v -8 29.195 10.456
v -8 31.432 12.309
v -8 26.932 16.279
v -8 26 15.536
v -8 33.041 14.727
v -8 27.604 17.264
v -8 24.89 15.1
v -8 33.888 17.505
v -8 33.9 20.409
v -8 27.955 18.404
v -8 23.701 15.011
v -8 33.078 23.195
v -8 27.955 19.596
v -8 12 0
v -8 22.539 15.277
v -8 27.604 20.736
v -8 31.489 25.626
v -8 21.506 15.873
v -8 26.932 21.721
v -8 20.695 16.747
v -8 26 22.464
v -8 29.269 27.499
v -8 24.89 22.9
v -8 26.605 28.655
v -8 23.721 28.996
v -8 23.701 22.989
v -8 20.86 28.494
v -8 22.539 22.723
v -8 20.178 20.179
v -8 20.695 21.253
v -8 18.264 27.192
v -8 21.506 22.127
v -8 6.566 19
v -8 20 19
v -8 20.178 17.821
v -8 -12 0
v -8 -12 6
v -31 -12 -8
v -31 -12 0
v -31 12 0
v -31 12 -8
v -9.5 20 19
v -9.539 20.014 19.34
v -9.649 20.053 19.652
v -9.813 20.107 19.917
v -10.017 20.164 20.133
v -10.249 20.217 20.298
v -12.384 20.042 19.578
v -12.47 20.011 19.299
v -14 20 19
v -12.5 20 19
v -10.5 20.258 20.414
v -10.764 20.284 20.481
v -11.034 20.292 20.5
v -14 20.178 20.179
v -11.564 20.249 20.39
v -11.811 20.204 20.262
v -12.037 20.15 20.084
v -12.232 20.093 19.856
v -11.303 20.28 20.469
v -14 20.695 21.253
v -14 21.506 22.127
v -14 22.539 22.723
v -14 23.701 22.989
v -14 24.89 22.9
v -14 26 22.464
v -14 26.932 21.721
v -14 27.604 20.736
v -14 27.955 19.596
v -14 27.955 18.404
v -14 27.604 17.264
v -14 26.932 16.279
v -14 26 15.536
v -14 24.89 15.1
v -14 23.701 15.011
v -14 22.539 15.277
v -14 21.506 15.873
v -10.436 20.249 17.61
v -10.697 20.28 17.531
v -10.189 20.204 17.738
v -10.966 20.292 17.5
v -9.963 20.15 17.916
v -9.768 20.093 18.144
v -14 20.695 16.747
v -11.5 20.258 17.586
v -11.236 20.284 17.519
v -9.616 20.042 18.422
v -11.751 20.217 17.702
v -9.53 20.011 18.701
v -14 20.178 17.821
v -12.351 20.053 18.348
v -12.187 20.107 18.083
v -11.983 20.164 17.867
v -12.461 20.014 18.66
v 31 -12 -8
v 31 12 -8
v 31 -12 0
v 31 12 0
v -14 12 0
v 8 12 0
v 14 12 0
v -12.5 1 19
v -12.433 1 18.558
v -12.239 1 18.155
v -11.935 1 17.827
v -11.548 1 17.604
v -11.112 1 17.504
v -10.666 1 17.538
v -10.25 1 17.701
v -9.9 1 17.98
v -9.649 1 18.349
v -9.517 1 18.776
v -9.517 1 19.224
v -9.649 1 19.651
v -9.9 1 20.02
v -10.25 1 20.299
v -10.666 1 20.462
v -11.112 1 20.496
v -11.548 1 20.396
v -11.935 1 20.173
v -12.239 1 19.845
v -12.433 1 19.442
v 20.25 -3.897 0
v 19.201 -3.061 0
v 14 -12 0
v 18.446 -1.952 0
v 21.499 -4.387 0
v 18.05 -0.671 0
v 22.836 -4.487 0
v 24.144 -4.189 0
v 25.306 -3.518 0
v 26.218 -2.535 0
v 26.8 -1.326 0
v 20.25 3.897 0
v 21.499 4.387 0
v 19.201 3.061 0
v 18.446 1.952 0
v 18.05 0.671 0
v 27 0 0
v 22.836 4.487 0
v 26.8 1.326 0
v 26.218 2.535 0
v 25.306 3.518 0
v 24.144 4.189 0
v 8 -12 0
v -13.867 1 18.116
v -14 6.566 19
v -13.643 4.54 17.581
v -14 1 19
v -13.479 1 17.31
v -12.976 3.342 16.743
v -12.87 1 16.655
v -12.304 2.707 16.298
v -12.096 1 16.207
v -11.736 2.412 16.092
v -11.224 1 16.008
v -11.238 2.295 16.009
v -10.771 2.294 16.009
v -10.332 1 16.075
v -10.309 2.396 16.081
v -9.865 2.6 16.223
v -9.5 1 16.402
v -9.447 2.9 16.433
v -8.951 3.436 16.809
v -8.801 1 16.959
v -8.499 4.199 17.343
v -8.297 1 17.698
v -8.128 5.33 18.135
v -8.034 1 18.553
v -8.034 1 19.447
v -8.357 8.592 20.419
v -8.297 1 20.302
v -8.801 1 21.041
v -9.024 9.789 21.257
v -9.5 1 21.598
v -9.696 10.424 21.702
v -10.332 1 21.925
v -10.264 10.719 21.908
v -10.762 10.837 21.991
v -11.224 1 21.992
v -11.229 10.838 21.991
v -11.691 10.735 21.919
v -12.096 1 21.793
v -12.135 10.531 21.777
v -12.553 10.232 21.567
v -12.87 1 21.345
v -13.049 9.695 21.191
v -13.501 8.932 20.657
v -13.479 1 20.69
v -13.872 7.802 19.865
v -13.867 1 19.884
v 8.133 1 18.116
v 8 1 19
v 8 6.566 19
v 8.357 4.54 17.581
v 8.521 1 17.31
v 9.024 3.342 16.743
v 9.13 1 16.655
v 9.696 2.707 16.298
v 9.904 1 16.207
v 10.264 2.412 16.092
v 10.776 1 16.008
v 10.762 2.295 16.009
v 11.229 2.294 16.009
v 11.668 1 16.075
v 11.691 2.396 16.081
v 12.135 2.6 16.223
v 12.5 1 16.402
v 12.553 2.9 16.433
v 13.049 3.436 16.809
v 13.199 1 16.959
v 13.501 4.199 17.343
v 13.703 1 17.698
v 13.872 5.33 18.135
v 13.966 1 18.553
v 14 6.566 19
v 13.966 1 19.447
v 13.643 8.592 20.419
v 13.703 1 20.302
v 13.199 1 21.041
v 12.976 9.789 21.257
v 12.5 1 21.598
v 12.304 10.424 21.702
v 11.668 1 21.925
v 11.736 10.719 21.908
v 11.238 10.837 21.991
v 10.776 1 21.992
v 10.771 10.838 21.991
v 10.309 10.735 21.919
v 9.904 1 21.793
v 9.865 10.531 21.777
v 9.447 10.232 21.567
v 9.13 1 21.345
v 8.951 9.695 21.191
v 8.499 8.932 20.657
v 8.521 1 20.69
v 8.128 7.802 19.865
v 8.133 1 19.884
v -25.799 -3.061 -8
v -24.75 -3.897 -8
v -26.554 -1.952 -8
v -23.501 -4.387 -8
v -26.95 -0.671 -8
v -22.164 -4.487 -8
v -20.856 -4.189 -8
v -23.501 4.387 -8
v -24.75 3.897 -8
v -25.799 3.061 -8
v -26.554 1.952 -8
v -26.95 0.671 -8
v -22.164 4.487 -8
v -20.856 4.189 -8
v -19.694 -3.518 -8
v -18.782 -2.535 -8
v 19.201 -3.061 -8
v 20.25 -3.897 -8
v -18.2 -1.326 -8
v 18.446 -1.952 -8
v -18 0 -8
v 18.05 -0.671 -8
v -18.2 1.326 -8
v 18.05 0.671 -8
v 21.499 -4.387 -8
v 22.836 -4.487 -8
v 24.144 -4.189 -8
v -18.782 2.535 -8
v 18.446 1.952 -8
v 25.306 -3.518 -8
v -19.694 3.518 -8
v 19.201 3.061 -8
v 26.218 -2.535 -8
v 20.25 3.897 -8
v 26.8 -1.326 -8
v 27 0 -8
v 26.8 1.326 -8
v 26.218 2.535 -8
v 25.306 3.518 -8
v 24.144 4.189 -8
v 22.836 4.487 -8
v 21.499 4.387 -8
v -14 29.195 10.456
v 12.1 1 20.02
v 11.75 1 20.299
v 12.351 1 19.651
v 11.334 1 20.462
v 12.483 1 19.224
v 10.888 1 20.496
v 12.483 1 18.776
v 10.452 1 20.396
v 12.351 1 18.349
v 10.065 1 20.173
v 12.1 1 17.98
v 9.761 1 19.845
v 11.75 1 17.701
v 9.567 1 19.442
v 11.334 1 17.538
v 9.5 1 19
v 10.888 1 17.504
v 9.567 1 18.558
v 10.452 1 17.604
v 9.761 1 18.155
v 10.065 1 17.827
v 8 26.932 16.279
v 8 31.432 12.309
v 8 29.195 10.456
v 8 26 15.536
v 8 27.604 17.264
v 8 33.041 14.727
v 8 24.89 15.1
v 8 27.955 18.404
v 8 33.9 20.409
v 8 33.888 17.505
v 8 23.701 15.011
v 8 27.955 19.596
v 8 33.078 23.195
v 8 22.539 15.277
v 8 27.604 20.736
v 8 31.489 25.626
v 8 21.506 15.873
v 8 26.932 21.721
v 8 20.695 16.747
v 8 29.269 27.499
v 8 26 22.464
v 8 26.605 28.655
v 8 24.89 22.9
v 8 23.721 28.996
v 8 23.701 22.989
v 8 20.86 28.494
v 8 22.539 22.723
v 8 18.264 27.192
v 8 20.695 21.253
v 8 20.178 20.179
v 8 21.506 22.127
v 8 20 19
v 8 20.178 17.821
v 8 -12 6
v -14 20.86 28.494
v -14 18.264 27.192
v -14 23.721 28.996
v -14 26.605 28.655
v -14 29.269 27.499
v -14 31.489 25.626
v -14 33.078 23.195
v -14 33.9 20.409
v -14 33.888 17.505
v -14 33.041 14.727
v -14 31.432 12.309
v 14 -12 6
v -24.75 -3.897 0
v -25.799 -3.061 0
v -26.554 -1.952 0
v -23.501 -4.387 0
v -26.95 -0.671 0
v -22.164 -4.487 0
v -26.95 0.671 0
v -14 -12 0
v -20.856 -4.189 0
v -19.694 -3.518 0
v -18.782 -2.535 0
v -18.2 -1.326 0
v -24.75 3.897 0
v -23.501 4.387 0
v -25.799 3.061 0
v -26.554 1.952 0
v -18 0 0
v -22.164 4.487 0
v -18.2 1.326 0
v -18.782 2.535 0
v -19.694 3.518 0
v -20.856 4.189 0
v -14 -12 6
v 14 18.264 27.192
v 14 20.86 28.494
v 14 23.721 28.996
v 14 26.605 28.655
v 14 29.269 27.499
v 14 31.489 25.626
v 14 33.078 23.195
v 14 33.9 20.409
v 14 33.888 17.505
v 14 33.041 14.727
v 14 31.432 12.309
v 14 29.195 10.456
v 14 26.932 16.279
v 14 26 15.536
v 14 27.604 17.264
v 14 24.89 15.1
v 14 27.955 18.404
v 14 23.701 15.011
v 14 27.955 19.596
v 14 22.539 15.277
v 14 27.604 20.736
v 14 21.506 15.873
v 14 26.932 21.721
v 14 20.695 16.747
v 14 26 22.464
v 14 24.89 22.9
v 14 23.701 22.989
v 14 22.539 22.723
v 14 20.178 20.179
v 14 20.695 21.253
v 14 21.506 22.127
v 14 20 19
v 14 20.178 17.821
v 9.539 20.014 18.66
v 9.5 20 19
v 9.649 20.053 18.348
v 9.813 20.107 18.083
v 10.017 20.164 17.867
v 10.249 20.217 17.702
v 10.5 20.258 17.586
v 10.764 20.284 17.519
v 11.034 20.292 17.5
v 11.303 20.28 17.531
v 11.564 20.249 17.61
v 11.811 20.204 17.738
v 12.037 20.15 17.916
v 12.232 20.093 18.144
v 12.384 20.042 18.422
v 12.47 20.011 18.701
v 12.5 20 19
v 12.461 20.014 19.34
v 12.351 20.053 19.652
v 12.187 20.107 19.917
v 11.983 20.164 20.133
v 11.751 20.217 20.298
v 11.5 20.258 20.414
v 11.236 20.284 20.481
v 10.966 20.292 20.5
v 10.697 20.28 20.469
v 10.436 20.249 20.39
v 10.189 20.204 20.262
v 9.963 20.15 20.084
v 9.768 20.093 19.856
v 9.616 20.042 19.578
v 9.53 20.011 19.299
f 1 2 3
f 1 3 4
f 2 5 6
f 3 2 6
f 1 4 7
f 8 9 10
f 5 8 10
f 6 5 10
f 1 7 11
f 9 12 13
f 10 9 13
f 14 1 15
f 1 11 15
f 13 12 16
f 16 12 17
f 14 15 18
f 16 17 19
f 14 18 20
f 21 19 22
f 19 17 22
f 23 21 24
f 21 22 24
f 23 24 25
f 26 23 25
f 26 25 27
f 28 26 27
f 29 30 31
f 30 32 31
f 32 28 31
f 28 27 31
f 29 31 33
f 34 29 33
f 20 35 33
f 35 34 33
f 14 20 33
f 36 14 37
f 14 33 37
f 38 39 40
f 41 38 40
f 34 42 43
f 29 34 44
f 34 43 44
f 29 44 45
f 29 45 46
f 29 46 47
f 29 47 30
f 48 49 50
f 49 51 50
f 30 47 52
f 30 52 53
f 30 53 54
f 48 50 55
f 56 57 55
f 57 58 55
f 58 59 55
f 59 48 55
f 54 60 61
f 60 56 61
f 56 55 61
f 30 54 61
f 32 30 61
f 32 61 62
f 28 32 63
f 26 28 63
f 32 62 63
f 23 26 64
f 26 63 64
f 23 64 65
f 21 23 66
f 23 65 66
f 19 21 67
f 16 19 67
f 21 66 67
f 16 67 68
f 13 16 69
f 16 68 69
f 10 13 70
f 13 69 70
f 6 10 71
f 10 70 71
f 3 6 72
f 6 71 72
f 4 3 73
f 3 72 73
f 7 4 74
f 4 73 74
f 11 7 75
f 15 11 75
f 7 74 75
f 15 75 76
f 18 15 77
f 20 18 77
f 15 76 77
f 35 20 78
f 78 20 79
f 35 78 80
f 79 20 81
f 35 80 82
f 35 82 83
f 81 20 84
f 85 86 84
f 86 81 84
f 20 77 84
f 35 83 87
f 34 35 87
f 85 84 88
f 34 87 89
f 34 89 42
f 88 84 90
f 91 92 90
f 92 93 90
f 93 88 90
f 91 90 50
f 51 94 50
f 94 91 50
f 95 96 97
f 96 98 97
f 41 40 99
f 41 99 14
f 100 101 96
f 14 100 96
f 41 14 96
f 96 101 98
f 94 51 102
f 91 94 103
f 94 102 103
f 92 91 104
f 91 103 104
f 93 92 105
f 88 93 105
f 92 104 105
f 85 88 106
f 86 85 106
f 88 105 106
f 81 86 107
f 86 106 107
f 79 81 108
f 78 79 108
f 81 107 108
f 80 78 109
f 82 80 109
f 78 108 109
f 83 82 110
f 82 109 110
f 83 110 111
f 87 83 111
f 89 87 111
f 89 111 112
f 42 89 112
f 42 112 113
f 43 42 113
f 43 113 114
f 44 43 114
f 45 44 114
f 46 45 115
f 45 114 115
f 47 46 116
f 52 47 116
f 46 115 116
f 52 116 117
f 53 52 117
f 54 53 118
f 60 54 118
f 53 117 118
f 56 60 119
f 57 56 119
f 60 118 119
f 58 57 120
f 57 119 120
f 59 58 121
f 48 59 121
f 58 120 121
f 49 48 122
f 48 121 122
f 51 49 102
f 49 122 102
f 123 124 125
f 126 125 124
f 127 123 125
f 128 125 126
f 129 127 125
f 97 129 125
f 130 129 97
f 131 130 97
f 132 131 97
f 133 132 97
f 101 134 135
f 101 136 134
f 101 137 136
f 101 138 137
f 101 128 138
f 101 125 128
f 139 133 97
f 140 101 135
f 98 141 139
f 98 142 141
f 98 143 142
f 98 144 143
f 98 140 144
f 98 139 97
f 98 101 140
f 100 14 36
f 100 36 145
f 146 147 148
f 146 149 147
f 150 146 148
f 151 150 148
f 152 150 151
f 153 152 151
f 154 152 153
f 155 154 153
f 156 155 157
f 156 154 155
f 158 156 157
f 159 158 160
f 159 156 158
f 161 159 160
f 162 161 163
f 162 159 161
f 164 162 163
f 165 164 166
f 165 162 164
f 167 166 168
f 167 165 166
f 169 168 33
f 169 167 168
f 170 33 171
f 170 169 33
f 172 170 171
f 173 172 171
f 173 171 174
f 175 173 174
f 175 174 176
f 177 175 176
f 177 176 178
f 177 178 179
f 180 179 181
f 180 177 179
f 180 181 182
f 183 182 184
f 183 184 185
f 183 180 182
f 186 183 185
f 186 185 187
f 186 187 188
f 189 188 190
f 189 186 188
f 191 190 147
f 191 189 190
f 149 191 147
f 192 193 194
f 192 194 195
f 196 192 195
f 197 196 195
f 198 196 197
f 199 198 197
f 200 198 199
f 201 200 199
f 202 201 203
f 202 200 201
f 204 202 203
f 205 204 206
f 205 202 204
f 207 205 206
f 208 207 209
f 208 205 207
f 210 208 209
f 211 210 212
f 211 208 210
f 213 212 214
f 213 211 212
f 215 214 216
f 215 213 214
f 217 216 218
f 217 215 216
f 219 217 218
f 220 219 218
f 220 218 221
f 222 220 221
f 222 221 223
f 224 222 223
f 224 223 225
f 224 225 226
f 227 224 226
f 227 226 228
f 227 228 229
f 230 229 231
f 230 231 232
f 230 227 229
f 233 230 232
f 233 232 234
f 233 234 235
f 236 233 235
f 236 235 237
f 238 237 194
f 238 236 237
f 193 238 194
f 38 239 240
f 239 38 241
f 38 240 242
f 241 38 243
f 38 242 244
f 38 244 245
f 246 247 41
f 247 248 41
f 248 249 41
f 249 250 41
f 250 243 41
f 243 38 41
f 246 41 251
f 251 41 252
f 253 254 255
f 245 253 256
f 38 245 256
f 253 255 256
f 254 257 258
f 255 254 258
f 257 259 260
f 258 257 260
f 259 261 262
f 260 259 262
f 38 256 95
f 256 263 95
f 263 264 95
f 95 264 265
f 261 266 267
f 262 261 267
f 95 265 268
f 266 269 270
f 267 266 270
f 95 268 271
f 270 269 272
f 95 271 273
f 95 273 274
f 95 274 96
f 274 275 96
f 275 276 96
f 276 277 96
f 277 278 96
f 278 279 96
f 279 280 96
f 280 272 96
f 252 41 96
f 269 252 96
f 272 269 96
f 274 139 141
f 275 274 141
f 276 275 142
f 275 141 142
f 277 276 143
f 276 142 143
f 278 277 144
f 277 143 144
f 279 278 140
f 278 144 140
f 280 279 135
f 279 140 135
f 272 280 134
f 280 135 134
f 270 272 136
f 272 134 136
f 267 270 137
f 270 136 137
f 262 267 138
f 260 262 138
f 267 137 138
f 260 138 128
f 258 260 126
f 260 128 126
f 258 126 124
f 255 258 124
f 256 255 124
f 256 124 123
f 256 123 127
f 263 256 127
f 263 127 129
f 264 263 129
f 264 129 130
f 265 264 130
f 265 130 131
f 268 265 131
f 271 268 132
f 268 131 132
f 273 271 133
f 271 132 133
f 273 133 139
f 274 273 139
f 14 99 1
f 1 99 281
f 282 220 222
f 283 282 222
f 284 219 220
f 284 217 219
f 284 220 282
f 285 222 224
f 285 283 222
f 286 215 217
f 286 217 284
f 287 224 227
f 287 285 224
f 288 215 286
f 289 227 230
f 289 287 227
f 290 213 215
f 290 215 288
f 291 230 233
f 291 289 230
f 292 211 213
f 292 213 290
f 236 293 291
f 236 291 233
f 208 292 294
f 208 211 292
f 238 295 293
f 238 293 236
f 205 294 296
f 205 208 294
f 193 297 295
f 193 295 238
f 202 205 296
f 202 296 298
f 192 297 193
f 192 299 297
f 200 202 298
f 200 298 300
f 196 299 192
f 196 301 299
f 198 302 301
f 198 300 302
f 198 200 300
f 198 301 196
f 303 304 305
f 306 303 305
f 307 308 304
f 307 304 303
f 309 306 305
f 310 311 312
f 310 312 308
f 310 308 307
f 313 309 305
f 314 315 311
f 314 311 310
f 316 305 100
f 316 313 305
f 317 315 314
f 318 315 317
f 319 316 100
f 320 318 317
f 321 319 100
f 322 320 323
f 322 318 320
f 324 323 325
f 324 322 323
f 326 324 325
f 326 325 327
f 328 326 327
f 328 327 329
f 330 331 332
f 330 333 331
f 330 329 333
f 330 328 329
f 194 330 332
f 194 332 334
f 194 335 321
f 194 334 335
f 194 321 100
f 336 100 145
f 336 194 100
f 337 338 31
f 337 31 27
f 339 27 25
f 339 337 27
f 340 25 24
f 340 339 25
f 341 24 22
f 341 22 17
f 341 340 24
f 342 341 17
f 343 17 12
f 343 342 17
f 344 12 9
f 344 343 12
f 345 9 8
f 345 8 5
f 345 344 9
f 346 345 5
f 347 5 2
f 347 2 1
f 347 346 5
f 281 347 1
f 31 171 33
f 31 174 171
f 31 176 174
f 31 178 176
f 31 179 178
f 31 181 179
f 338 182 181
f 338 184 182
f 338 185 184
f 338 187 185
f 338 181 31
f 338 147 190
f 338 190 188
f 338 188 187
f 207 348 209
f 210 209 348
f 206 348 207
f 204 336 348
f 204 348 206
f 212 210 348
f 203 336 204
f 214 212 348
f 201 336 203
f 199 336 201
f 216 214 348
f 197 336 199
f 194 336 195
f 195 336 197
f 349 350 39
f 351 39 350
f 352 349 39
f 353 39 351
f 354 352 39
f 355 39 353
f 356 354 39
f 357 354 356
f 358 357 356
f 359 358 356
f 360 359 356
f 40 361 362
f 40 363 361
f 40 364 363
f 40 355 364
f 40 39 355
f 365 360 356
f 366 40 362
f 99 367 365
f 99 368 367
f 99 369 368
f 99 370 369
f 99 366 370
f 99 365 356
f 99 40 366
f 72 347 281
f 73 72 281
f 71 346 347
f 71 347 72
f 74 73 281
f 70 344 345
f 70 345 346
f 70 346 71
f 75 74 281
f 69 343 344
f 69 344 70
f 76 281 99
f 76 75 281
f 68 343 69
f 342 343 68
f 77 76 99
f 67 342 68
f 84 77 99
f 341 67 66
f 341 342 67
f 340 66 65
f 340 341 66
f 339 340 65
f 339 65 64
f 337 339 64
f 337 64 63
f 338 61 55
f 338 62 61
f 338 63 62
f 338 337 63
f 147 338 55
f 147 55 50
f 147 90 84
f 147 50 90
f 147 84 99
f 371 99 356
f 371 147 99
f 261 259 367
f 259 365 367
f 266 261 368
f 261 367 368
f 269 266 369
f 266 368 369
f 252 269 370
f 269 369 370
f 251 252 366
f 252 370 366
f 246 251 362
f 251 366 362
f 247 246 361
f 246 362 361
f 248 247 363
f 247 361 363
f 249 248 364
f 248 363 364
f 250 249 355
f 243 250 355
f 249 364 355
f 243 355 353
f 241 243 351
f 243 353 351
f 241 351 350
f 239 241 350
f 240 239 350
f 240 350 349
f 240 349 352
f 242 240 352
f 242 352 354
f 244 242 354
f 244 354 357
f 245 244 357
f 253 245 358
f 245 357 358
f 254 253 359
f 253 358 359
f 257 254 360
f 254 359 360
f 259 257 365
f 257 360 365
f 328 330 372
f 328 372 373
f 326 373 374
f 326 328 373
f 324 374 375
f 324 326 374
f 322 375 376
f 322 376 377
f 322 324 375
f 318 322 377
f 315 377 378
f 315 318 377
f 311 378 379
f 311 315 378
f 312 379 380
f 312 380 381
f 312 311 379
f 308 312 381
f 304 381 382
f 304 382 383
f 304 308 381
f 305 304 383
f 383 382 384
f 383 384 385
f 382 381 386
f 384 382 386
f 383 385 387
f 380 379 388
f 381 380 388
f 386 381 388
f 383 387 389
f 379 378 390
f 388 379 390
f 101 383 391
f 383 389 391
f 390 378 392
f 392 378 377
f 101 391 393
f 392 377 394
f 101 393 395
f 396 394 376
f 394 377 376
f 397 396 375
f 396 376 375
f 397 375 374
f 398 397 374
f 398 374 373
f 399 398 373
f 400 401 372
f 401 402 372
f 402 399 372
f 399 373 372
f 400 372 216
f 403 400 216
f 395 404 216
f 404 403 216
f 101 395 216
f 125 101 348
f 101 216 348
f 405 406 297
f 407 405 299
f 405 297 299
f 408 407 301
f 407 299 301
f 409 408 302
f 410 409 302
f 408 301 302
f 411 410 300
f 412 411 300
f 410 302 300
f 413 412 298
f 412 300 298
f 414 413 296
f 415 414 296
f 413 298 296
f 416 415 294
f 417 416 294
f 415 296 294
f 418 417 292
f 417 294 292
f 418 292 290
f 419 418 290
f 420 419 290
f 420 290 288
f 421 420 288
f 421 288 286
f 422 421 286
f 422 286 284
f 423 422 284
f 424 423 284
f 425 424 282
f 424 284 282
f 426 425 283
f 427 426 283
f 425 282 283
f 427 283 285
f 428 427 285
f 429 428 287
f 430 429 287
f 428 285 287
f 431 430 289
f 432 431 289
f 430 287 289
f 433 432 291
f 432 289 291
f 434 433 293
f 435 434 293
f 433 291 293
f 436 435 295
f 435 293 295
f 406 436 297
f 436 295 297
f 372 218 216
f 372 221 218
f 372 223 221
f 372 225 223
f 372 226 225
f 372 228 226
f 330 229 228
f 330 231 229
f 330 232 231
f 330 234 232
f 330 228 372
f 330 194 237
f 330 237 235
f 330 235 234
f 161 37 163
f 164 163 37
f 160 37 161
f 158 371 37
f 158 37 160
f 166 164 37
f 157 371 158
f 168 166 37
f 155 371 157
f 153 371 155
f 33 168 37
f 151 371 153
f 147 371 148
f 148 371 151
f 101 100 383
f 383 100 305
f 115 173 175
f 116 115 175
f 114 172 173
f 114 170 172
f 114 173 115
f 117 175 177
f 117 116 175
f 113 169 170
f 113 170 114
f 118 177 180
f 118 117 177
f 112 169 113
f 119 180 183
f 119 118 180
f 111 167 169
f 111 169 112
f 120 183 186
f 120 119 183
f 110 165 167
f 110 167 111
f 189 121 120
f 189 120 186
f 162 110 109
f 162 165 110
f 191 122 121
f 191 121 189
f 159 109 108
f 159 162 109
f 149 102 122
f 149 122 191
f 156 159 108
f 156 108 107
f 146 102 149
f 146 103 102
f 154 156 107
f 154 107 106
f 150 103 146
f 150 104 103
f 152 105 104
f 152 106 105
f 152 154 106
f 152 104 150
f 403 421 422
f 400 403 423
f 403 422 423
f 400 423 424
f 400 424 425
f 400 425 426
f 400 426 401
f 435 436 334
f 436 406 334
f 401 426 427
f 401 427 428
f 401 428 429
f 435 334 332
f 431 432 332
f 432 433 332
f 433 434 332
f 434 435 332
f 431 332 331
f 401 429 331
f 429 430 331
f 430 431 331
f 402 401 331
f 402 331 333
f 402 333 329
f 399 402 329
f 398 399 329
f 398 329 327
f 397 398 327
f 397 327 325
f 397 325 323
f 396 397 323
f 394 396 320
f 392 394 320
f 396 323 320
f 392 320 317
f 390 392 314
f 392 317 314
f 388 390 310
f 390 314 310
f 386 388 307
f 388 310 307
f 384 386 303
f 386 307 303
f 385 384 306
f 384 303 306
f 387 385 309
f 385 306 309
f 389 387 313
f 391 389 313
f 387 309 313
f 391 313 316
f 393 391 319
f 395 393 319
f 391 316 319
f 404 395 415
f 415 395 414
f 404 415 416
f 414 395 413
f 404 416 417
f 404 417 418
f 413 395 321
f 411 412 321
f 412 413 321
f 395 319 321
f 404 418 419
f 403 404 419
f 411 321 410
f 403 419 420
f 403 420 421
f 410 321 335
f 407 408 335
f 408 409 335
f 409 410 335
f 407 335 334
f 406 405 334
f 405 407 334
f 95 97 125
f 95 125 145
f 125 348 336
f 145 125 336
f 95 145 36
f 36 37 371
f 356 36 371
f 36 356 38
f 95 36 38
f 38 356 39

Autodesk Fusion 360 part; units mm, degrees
sketch "草图1" plane through (0, 0, 0) normal (0, 0, 1) x (1, 0, 0)
  line L0 (-31, 12) -> (31, 12)
  line L1 (31, 12) -> (31, -12)
  line L2 (31, -12) -> (-31, -12)
  line L3 (-31, -12) -> (-31, 12)
  circle A0 centre (-22.5, 0) radius 4.5
  circle A1 centre (22.5, 0) radius 4.5
  line L4 (0, 20) -> (0, -25) construction
  line L5 (35, 0) -> (-34, 0) construction
  dimension "d1" = 24
  dimension "d2" = 62
  dimension "d3" = 9
  dimension "d4" = 45
extrude "拉伸1" add sketch "草图1" against normal blind 8 makes body 1
ref_plane "工作平面1" through (-14, 0, -4) normal (-1, 0, 0) x (0, 1, 0)
sketch "草图2" plane through (-14, 0, 0) normal (-1, 0, 0) x (0, -1, 0)
  line L0 (-12, 0) -> (12, 0)
  line L1 (12, 0) -> (12, 6)
  line L2 (12, 6) -> (-18.2642, 27.1915)
  line L3 (-12, 0) -> (-29.1954, 10.4555)
  arc A0 (-18.2642, 27.1915) -> (-29.1954, 10.4555) centre (-24, 19) ccw
  circle A1 centre (-24, 19) radius 4
  line L4 (0, 23) -> (0, -19) construction
  line L5 (12, -8) -> (-12, -8) construction
  line L6 (12, 0) -> (12, -8) construction
  dimension "d8" = 6
  dimension "d9" = 27
  dimension "d10" = 36
  dimension "d11" = 8
  dimension "d12" = 10
  dimension "d13" = 24
extrude "拉伸2" add sketch "草图2" against normal blind 6 separate body makes body 2
ref_plane "工作平面2" through (-11, 1, 3) normal (0, -1, 0) x (0, 0, -1)
sketch "草图3" plane through (0, 1, 0) normal (0, -1, 0) x (-1, 0, 0)
  circle A0 centre (11, -19) radius 3
  circle A1 centre (11, -19) radius 1.5
  line L0 (-31, 8) -> (31, 8)
  line L1 (8, -27.1915) -> (8, -6)
  dimension "d17" = 6
  dimension "d18" = 3
  dimension "d19" = 27
  dimension "d20" = 3
extrude "拉伸3" add sketch "草图3" along normal up to surface end surface at (-10, 20.005, 18.8006) on bodies 2 bodies 2
extrude "拉伸4" cut sketch "草图3" along normal up to surface contours A1 end surface at (-10, 20.005, 18.8006) on bodies 2 bodies 2
copy_body "复制和粘贴实体1" bodies 2 makes body 3
move_body "移动1" bodies 3 to x (1, 0, 0) y (0, 1, 0) z (0, 0, 1) at (22, 0, 0)
combine "合并1" operation add target body 1 tool bodies 3 2
